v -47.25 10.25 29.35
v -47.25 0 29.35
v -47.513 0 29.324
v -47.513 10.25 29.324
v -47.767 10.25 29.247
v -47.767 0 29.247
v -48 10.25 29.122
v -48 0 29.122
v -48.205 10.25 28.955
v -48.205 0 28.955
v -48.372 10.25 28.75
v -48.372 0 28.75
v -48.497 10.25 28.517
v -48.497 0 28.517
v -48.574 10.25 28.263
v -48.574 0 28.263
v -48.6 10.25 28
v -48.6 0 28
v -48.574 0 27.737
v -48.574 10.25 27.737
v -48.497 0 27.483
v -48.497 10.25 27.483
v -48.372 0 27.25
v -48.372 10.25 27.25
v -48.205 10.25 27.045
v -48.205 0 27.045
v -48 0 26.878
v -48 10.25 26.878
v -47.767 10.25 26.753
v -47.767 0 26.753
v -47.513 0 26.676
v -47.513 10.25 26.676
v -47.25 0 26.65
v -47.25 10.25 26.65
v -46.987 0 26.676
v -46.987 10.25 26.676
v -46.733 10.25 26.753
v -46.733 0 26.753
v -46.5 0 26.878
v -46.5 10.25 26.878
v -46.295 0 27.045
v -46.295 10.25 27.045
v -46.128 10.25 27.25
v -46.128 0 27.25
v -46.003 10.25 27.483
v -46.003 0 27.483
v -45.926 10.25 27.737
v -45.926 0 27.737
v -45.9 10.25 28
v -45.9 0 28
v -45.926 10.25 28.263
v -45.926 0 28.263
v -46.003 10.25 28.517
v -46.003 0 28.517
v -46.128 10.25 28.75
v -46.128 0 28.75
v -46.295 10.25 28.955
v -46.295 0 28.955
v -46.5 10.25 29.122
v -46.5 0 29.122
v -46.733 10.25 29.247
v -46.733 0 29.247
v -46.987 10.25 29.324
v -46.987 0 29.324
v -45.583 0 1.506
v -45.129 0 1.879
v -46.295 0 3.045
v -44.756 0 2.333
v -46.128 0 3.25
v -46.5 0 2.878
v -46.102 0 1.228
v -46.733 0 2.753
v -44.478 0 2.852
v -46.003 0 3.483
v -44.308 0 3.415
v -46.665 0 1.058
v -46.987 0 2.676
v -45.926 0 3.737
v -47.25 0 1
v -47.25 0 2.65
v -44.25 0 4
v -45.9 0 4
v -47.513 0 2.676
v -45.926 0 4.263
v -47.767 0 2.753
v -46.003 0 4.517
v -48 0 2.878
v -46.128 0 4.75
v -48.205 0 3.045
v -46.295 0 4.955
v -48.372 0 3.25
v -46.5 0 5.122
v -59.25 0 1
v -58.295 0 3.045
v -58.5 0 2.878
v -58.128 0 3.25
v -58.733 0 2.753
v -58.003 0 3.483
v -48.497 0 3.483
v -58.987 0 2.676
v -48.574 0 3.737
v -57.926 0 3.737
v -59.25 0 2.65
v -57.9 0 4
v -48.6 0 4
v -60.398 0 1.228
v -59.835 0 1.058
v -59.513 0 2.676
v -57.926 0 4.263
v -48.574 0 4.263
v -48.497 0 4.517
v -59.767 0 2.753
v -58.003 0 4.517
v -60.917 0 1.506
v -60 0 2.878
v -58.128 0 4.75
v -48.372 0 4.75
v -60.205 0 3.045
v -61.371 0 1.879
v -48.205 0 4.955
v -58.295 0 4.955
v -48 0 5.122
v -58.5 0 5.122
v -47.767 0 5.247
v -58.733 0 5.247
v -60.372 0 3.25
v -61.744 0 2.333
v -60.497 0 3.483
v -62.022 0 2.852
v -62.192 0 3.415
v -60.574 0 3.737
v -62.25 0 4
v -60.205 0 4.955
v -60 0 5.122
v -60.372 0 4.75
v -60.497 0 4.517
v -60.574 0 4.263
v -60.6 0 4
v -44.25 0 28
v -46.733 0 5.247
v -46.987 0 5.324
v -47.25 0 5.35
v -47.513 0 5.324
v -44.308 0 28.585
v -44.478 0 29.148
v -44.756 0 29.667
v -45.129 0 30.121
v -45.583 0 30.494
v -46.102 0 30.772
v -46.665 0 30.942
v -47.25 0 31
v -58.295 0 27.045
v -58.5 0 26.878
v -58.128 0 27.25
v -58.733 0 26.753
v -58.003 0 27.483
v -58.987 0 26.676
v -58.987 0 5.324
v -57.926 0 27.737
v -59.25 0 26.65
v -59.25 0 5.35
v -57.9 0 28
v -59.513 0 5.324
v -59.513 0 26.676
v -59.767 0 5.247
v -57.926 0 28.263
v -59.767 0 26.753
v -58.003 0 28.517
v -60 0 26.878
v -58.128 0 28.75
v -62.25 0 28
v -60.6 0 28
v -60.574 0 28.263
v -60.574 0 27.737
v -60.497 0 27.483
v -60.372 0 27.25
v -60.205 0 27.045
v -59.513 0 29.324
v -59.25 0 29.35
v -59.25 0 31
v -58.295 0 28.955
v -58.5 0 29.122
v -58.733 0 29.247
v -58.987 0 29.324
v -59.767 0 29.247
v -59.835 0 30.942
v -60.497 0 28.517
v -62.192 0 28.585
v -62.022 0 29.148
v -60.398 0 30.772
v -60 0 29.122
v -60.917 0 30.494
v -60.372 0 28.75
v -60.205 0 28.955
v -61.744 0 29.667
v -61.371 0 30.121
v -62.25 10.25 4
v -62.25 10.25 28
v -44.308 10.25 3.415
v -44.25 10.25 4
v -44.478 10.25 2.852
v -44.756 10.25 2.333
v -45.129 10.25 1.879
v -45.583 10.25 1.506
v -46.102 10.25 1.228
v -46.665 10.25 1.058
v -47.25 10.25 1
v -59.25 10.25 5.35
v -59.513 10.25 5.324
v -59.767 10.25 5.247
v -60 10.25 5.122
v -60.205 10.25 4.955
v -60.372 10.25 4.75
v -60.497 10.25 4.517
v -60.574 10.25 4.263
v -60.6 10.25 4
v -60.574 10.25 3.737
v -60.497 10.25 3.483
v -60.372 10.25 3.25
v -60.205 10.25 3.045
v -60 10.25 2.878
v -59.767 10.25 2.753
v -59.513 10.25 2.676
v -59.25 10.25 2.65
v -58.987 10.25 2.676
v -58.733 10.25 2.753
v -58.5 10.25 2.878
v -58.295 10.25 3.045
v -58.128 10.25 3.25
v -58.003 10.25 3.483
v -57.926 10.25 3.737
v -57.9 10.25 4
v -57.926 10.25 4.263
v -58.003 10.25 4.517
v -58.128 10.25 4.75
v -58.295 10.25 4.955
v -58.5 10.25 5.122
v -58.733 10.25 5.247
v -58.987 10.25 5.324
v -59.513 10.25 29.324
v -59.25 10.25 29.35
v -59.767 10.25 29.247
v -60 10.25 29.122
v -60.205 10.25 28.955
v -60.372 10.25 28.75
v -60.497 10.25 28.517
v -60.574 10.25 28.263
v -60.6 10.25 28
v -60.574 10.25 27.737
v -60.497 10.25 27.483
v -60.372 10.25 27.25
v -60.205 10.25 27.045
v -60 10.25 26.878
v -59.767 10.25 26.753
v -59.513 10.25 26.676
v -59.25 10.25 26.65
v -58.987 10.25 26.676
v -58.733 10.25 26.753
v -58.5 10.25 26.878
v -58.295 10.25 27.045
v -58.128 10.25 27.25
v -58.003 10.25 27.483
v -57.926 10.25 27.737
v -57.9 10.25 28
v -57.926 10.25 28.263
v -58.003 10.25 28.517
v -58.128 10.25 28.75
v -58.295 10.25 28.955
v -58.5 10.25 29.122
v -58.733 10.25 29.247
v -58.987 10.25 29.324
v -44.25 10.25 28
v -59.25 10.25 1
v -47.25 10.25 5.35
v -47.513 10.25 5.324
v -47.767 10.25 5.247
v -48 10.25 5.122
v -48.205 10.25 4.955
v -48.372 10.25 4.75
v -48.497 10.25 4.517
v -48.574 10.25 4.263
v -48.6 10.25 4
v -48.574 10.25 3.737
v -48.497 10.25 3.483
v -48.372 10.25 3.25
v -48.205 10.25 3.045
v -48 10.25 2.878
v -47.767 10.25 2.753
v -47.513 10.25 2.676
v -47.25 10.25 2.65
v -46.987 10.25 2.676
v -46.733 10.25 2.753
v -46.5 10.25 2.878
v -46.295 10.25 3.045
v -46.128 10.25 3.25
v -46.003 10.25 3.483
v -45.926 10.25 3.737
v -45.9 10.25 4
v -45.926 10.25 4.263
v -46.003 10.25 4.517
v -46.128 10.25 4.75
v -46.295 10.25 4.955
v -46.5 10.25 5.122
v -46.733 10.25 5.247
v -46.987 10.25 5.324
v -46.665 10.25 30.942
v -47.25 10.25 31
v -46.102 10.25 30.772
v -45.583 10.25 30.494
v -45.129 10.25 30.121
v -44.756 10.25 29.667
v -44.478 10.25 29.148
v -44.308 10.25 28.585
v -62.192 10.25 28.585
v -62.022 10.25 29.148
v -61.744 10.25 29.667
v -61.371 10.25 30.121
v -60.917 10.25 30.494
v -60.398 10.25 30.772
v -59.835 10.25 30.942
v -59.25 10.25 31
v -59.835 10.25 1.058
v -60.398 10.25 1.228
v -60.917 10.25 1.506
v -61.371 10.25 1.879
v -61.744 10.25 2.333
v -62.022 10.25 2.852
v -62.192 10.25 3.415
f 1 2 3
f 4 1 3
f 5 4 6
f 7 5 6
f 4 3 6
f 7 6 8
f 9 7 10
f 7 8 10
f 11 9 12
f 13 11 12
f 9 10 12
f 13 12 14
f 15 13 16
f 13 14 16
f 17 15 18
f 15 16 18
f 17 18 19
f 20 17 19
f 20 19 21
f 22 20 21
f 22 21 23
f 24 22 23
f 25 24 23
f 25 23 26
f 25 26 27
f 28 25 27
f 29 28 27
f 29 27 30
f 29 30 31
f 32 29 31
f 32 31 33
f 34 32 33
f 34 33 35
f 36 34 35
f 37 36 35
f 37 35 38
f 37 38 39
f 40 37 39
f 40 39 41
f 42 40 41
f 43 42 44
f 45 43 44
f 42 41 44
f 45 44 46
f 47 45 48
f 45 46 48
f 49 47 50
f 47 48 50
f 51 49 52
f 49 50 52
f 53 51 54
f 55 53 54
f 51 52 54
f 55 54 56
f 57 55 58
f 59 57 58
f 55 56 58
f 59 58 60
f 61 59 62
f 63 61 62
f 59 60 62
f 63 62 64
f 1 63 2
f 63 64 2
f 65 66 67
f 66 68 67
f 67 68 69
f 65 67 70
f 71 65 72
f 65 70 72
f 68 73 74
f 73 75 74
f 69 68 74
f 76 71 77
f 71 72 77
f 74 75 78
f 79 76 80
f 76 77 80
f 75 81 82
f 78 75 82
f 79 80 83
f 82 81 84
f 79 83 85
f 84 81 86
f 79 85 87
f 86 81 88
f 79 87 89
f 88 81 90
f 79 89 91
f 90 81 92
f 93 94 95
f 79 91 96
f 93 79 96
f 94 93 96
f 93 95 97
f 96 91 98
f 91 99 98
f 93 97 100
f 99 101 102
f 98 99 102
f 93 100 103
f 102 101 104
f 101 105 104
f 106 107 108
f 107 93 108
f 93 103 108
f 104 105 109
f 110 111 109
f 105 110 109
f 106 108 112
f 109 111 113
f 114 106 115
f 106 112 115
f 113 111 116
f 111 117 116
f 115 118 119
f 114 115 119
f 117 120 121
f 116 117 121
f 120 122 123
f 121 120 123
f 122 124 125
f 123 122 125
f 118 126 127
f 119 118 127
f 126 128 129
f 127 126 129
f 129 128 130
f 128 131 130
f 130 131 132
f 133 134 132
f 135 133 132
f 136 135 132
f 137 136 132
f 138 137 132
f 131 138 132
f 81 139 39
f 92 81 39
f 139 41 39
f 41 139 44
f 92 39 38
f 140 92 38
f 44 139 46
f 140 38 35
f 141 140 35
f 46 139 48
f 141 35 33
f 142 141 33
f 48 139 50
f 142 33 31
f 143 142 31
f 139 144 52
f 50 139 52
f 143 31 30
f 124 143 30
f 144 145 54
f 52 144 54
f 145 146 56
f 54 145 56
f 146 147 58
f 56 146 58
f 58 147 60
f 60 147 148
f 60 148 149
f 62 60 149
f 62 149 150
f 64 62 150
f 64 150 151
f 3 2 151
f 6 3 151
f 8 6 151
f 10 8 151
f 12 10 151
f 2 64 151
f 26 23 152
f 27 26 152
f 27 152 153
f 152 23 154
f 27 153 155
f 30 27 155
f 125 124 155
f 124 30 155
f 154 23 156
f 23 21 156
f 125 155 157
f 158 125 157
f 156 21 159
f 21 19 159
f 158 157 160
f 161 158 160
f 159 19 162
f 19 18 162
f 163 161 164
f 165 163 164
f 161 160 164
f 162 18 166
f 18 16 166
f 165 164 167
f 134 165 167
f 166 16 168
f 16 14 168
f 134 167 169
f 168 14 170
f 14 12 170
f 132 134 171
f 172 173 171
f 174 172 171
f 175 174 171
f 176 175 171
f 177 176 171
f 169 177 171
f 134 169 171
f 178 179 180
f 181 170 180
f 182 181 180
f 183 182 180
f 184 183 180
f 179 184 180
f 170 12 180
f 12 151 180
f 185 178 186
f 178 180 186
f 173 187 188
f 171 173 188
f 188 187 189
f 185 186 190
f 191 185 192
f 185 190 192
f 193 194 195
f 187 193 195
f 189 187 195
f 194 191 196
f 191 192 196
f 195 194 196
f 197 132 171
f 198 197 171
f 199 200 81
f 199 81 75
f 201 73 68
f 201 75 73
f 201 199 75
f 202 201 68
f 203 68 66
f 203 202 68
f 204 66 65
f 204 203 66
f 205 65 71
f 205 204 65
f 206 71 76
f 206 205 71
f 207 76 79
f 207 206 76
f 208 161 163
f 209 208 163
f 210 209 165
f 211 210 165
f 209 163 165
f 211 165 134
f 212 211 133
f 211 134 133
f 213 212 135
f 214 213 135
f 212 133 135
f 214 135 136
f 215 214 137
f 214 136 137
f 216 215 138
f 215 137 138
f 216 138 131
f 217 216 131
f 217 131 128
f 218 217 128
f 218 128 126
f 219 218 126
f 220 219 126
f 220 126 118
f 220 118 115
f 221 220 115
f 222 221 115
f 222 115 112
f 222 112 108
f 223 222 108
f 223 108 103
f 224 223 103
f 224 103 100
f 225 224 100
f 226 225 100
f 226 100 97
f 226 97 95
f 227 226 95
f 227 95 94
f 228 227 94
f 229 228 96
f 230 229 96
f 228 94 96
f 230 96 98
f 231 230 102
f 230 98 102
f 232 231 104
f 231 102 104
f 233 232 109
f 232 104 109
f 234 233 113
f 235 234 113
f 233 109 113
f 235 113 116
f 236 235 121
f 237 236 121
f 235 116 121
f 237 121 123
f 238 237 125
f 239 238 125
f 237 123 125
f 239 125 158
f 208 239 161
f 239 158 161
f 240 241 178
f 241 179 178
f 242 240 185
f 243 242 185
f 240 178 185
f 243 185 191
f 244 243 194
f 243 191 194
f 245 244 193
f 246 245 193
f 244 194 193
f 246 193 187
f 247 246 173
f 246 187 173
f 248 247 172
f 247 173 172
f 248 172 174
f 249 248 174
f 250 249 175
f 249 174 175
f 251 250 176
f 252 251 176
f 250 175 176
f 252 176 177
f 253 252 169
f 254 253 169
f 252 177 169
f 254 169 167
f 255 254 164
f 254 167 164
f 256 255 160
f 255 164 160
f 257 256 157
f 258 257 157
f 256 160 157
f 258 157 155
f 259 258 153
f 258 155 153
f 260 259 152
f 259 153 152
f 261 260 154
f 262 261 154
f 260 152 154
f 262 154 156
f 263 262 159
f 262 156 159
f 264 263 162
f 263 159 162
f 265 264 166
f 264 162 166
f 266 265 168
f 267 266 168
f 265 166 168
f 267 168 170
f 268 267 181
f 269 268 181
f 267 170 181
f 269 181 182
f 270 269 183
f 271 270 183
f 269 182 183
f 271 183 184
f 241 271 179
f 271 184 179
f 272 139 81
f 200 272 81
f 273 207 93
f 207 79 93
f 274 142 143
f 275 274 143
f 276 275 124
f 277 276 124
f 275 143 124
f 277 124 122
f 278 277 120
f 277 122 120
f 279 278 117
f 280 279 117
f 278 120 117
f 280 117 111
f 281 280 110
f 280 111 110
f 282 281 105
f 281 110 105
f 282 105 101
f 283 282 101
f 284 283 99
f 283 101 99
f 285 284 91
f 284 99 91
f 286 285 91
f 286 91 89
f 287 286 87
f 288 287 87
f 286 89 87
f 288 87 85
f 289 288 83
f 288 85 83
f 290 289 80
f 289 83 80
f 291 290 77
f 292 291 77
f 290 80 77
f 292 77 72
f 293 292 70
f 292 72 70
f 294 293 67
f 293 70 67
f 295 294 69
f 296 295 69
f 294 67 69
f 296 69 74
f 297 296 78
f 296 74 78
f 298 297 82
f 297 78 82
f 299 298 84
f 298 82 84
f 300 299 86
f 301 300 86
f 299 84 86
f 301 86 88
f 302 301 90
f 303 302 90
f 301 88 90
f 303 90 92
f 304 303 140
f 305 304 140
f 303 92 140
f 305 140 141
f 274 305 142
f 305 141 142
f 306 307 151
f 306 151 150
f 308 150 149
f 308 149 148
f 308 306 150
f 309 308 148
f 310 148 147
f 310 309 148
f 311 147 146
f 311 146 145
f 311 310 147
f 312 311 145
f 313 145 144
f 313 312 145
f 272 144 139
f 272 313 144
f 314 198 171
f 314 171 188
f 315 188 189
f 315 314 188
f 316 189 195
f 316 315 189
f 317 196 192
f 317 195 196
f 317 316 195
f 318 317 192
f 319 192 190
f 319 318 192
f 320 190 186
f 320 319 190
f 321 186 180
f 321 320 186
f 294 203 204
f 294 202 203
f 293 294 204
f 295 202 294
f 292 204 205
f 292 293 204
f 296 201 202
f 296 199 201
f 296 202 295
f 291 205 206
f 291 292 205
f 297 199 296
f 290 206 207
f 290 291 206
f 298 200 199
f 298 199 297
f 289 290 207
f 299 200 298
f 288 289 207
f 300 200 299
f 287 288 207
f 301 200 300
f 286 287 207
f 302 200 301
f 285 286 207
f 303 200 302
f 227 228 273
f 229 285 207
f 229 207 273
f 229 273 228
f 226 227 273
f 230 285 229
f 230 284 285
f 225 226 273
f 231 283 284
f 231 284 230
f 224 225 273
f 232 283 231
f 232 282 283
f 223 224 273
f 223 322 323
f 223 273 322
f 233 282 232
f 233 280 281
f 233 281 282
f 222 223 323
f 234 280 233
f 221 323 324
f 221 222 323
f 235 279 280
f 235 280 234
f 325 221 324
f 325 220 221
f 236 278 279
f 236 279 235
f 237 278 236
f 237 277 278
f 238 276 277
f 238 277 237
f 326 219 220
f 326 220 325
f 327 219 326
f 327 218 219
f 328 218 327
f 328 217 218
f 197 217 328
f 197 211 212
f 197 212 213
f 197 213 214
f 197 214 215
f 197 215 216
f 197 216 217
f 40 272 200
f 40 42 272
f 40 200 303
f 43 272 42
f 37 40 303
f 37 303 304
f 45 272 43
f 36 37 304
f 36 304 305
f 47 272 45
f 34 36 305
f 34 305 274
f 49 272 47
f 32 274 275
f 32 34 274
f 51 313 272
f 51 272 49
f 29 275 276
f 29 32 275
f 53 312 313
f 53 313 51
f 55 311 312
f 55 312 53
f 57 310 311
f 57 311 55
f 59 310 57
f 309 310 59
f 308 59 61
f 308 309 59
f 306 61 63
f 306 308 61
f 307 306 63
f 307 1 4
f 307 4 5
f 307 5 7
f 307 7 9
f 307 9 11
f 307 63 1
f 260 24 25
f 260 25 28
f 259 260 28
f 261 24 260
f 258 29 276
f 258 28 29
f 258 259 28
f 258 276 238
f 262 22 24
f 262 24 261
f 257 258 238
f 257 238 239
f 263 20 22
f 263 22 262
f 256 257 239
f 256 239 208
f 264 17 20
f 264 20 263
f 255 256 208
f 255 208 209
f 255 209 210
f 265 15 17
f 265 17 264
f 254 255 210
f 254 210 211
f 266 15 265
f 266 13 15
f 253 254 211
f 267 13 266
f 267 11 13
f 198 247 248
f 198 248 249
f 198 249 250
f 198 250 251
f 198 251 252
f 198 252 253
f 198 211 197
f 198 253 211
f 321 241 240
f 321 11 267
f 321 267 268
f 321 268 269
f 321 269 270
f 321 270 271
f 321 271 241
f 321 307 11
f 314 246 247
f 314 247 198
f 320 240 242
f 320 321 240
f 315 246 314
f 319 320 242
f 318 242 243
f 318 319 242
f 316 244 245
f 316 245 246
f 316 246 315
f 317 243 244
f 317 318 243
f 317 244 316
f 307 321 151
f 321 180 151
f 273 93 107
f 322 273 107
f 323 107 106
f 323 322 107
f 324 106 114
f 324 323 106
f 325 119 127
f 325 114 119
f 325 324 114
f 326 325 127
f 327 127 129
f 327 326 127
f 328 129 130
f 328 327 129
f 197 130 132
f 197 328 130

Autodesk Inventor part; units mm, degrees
ref_plane "YZ Plane" through (0, 0, 0) normal (1, 0, 0) x (0, 1, 0)
ref_plane "XZ Plane" through (0, 0, 0) normal (0, 1, 0) x (-1, 0, 0)
ref_plane "XY Plane" through (0, 0, 0) normal (0, 0, 1) x (1, 0, 0)
sketch "スケッチ1" plane through (0, 0, 0) normal (0, 1, 0) x (-1, 0, 0)
  circle A0 centre (0, 0) radius 5
  circle A1 centre (0, 0) radius 11
  line L0 (0, 0) -> (0, -11)
  line L1 (0, 0) -> (0, 11)
  circle A2 centre (0, 9.5) radius 4.5
  circle A3 centre (0, -9.5) radius 4.5
  circle A4 centre (2.3645, 112.8492) radius 126.872
  circle A5 centre (8.3362, 58.5776) radius 45.2805
  circle A6 centre (2.3645, 112.8492) radius 54.5992
  line L2 (62.25, 31) -> (44.25, 31)
  line L3 (44.25, 31) -> (44.25, 1)
  line L4 (44.25, 1) -> (62.25, 1)
  line L5 (62.25, 1) -> (62.25, 31)
  line L6 (0, 0) -> (13.75, 0)
  line L7 (13.75, 0) -> (13.75, -16.75)
  line L8 (13.75, -16.75) -> (0, -16.75)
  line L9 (0, -16.75) -> (0, 0)
  line L10 (70.25, 35.25) -> (36.25, 35.25)
  line L11 (36.25, 35.25) -> (36.25, -11.25)
  line L12 (36.25, -11.25) -> (70.25, -11.25)
  line L13 (70.25, -11.25) -> (70.25, 35.25)
  line L14 (70.25, 0) -> (36.25, 0)
  line L15 (0, 0) -> (36.25, 0)
  point P0 (62.25, 1)
  point P1 (0.7536, 13.9365)
  point P2 (0, 5)
  point P3 (0, -5)
  point P4 (-0.087, -13.9992)
  dimension "d4" = 253.744
  dimension "d5" = 90.561
  dimension "d0" = 10
  dimension "d1" = 22
  dimension "d2" = 9
  dimension "d3" = 9
  dimension "d7" = 18
  dimension "d8" = 30
  dimension "d9" = 13.75
  dimension "d10" = 16.75
  dimension "d11" = 46.5
  dimension "d12" = 4.25
  dimension "d13" = 8
  dimension "d14" = 34
  dimension "d15" = 11.25
  dimension "d16" = 70.25
extrude "押し出し1" add sketch "スケッチ1" along normal blind 10.25 contours L2 L5 L4 L3
fillet "フィレット1" radius 3 4 edges at (-62.25, 5.125, 31) (-44.25, 5.125, 31) (-62.25, 5.125, 1) (-44.25, 5.125, 1)
sketch "スケッチ5" plane through (0, 10.25, 0) normal (0, 1, 0) x (1, 0, 0)
  line L0 (-59.25, -4) -> (-47.25, -4)
  line L1 (-47.25, -4) -> (-47.25, -28)
  line L2 (-47.25, -28) -> (-59.25, -28)
  line L3 (-59.25, -28) -> (-59.25, -4)
  line L4 (-62.25, -1) -> (-62.25, -28) projected
  line L5 (-59.25, -31) -> (-47.25, -31) projected
  point P0 (0, 0)
  point P1 (-62.25, -2.8114)
  dimension "d37" = 3
  dimension "d38" = 3
  dimension "d39" = 12
  dimension "d40" = 24
hole "穴2" at (-59.25, 10.25, 28) at (-47.25, 10.25, 28) at (-47.25, 10.25, 4) at (-59.25, 10.25, 4) direction (0, -1, 0) diameter 2.7 end through all
properties part number "connectpart5"
